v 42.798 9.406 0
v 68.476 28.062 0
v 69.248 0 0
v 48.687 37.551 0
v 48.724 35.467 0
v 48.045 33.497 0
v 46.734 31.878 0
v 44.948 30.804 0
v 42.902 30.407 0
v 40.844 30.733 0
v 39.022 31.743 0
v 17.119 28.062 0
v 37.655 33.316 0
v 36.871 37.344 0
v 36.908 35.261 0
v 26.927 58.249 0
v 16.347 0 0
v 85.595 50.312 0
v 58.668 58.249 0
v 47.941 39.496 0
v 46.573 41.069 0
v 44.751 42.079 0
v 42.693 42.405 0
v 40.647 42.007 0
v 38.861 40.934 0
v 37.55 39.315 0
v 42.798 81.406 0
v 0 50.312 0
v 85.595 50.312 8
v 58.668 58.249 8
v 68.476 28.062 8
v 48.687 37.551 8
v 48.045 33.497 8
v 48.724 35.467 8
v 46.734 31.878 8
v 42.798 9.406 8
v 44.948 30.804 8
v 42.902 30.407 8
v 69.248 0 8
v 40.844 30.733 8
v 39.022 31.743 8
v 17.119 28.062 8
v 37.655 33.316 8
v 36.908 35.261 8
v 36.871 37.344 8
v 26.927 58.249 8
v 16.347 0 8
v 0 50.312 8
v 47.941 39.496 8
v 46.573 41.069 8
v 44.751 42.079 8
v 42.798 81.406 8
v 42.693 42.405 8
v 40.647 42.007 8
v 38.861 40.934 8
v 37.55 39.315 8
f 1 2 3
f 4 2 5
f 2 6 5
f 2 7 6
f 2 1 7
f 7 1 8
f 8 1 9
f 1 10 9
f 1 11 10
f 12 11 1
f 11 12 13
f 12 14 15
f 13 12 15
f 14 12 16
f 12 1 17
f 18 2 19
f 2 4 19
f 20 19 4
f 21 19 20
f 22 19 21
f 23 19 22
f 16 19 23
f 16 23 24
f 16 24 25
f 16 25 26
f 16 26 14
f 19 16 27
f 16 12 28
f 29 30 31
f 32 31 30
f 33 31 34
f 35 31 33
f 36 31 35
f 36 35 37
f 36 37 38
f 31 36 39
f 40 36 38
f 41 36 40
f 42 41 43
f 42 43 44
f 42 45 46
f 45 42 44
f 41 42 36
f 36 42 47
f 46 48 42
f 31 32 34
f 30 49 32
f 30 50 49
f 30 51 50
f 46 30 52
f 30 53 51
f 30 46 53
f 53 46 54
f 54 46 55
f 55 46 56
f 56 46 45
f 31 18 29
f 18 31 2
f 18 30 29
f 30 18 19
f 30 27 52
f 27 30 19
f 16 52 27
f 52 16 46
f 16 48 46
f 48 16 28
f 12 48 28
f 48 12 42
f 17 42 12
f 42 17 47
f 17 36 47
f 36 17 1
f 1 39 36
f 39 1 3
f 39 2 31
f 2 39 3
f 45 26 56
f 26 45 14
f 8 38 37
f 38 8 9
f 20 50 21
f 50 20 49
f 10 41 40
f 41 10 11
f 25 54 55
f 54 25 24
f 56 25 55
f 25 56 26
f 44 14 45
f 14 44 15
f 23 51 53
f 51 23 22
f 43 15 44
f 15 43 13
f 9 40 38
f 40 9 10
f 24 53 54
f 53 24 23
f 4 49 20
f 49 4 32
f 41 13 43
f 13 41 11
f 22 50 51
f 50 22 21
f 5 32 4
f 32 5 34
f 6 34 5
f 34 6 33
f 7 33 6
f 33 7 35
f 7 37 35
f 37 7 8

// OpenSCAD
$fn = 32;

// ----------------------------------------------------------------------
// Star wheel: 5-point star, R45
// ----------------------------------------------------------------------

// --- parameters (mm) ---
n_points = 5;             // number of points / teeth
r_out = 45;               // tip radius
r_in = 27;                // root radius
bore_r = 6;               // centre bore radius
plate_t = 8;              // plate thickness, Z (extrusion height)
bore_d = 12;              // centre bore diameter

profile = [[42.798, 81.406], [26.927, 58.249], [0, 50.312], [17.119, 28.062], [16.347, 0], [42.798, 9.406], [69.248, 0], [68.476, 28.062], [85.595, 50.312], [58.668, 58.249]];  // primary outline, 10 points, counter clockwise
void_1 = [[48.687, 37.551], [47.941, 39.496], [46.573, 41.069], [44.751, 42.079], [42.693, 42.405], [40.647, 42.007], [38.861, 40.934], [37.55, 39.315], [36.871, 37.344], [36.908, 35.261], [37.655, 33.316], [39.022, 31.743], [40.844, 30.733], [42.902, 30.407], [44.948, 30.804], [46.734, 31.878], [48.045, 33.497], [48.724, 35.467]];  // centre bore, 18 points

// --- the one profile operation ---
difference() {
  linear_extrude(height = plate_t) polygon(points = profile);
  translate([0, 0, -1])
    linear_extrude(height = plate_t + 2) polygon(points = void_1);
}
